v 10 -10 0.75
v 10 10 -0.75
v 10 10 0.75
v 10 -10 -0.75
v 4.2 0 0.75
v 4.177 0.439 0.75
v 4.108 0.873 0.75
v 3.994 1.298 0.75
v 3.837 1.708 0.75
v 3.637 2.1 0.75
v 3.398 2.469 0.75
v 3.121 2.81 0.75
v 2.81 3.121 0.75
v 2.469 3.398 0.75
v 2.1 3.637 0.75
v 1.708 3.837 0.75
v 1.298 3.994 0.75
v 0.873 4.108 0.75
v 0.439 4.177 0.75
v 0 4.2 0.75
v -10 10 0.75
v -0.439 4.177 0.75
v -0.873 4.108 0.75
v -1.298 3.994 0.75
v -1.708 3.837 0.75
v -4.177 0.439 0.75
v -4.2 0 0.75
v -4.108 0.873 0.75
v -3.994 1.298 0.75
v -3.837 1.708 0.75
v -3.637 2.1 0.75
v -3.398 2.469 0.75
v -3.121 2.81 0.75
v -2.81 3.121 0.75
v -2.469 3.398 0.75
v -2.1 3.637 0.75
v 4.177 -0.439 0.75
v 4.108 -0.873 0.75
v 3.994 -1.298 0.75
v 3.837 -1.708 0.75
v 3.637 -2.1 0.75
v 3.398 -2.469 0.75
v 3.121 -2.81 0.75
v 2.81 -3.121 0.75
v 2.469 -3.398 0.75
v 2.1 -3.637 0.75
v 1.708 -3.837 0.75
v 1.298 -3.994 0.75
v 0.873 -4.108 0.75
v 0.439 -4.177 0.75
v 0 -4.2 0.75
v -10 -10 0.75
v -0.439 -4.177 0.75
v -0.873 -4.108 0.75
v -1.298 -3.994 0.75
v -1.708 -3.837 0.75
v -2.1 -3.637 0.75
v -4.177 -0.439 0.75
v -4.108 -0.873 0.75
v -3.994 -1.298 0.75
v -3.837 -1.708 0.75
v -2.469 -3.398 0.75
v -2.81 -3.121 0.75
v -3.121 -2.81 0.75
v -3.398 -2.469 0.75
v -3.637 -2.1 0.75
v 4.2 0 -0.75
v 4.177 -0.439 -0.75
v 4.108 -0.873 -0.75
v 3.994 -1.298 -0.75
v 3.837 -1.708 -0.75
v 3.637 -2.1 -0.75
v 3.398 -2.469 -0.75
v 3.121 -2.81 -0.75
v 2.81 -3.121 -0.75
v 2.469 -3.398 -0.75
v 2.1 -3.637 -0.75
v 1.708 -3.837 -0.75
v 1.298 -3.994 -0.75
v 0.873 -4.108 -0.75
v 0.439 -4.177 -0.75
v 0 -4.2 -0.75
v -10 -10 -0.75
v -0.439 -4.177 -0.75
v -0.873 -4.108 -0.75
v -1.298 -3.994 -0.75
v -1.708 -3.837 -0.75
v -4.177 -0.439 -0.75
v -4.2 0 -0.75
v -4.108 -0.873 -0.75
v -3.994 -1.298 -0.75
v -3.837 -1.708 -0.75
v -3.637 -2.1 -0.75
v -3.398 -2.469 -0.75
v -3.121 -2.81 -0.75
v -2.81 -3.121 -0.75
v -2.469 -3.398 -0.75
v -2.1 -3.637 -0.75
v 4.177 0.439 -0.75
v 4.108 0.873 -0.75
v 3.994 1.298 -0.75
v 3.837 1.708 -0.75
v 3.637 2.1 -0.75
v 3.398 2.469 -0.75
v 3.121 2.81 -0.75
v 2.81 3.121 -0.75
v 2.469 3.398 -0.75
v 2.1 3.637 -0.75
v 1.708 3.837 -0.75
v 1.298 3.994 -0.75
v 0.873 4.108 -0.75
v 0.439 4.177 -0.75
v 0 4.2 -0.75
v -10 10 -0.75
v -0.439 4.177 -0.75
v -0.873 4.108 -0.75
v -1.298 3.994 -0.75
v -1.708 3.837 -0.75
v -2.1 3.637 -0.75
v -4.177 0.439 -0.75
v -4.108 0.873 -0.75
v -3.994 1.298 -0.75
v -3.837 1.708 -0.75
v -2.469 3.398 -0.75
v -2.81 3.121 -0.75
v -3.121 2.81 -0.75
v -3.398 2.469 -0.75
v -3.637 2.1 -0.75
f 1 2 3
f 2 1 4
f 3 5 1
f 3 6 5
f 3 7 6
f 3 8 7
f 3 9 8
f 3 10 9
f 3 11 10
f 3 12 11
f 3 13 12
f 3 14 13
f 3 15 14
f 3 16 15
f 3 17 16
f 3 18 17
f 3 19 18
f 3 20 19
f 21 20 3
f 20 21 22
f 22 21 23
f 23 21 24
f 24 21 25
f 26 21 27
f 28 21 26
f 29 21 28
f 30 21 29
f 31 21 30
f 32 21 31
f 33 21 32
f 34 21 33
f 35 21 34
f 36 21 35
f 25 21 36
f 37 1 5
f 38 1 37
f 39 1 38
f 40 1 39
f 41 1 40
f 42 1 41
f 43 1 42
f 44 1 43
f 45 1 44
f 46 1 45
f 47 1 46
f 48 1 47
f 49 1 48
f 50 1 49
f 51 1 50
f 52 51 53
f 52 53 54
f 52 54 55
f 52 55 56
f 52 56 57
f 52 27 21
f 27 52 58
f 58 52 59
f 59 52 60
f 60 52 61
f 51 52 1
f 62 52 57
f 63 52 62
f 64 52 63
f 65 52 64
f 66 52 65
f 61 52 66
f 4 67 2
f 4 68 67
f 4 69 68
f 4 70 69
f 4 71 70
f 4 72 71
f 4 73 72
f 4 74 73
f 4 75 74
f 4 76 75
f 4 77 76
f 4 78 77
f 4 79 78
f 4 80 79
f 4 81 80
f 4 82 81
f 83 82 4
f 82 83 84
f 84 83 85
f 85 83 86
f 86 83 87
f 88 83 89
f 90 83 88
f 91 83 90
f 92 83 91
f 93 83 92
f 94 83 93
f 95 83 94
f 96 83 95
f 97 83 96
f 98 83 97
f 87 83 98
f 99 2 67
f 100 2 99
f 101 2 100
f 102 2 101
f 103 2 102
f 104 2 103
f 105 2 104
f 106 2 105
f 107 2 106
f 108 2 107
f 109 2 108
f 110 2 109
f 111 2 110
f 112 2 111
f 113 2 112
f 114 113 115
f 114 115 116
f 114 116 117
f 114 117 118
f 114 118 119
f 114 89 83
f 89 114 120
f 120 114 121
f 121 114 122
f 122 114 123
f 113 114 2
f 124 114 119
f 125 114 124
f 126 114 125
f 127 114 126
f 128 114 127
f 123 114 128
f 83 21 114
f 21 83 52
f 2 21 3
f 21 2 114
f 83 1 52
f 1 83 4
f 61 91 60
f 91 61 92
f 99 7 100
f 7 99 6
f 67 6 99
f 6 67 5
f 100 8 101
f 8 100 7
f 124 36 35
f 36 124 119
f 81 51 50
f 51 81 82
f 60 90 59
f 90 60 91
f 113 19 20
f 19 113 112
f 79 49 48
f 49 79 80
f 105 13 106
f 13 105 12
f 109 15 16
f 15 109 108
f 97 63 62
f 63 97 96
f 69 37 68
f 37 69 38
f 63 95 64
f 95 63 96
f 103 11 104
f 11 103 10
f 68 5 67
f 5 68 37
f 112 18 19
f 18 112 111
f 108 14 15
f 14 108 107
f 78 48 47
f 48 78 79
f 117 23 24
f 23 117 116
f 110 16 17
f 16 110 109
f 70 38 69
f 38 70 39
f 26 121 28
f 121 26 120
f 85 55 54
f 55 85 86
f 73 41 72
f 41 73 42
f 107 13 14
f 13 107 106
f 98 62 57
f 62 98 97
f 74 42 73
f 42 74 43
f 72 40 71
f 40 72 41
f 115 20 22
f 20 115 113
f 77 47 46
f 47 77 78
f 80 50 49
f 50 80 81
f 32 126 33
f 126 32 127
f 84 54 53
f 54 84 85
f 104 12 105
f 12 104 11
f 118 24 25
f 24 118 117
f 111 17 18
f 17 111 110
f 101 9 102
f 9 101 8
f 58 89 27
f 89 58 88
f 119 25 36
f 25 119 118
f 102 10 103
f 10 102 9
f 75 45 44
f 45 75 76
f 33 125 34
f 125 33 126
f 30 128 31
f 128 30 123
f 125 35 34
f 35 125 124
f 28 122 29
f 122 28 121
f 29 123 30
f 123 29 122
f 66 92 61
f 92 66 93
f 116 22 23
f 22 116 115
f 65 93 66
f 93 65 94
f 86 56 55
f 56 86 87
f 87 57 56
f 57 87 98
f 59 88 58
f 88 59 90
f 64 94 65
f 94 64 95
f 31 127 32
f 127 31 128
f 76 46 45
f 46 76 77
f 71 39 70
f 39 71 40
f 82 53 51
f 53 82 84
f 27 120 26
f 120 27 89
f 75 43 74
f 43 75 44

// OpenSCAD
// Square mounting washer.
$fn = 60;
eps = 0.02;
hole_d = 8.4;
side = 20;
thickness = 1.5;
difference() {
    cube([side,side,thickness],center=true);
    translate([0,0,-thickness/2-eps]) cylinder(d=hole_d,h=thickness+2*eps);
}
